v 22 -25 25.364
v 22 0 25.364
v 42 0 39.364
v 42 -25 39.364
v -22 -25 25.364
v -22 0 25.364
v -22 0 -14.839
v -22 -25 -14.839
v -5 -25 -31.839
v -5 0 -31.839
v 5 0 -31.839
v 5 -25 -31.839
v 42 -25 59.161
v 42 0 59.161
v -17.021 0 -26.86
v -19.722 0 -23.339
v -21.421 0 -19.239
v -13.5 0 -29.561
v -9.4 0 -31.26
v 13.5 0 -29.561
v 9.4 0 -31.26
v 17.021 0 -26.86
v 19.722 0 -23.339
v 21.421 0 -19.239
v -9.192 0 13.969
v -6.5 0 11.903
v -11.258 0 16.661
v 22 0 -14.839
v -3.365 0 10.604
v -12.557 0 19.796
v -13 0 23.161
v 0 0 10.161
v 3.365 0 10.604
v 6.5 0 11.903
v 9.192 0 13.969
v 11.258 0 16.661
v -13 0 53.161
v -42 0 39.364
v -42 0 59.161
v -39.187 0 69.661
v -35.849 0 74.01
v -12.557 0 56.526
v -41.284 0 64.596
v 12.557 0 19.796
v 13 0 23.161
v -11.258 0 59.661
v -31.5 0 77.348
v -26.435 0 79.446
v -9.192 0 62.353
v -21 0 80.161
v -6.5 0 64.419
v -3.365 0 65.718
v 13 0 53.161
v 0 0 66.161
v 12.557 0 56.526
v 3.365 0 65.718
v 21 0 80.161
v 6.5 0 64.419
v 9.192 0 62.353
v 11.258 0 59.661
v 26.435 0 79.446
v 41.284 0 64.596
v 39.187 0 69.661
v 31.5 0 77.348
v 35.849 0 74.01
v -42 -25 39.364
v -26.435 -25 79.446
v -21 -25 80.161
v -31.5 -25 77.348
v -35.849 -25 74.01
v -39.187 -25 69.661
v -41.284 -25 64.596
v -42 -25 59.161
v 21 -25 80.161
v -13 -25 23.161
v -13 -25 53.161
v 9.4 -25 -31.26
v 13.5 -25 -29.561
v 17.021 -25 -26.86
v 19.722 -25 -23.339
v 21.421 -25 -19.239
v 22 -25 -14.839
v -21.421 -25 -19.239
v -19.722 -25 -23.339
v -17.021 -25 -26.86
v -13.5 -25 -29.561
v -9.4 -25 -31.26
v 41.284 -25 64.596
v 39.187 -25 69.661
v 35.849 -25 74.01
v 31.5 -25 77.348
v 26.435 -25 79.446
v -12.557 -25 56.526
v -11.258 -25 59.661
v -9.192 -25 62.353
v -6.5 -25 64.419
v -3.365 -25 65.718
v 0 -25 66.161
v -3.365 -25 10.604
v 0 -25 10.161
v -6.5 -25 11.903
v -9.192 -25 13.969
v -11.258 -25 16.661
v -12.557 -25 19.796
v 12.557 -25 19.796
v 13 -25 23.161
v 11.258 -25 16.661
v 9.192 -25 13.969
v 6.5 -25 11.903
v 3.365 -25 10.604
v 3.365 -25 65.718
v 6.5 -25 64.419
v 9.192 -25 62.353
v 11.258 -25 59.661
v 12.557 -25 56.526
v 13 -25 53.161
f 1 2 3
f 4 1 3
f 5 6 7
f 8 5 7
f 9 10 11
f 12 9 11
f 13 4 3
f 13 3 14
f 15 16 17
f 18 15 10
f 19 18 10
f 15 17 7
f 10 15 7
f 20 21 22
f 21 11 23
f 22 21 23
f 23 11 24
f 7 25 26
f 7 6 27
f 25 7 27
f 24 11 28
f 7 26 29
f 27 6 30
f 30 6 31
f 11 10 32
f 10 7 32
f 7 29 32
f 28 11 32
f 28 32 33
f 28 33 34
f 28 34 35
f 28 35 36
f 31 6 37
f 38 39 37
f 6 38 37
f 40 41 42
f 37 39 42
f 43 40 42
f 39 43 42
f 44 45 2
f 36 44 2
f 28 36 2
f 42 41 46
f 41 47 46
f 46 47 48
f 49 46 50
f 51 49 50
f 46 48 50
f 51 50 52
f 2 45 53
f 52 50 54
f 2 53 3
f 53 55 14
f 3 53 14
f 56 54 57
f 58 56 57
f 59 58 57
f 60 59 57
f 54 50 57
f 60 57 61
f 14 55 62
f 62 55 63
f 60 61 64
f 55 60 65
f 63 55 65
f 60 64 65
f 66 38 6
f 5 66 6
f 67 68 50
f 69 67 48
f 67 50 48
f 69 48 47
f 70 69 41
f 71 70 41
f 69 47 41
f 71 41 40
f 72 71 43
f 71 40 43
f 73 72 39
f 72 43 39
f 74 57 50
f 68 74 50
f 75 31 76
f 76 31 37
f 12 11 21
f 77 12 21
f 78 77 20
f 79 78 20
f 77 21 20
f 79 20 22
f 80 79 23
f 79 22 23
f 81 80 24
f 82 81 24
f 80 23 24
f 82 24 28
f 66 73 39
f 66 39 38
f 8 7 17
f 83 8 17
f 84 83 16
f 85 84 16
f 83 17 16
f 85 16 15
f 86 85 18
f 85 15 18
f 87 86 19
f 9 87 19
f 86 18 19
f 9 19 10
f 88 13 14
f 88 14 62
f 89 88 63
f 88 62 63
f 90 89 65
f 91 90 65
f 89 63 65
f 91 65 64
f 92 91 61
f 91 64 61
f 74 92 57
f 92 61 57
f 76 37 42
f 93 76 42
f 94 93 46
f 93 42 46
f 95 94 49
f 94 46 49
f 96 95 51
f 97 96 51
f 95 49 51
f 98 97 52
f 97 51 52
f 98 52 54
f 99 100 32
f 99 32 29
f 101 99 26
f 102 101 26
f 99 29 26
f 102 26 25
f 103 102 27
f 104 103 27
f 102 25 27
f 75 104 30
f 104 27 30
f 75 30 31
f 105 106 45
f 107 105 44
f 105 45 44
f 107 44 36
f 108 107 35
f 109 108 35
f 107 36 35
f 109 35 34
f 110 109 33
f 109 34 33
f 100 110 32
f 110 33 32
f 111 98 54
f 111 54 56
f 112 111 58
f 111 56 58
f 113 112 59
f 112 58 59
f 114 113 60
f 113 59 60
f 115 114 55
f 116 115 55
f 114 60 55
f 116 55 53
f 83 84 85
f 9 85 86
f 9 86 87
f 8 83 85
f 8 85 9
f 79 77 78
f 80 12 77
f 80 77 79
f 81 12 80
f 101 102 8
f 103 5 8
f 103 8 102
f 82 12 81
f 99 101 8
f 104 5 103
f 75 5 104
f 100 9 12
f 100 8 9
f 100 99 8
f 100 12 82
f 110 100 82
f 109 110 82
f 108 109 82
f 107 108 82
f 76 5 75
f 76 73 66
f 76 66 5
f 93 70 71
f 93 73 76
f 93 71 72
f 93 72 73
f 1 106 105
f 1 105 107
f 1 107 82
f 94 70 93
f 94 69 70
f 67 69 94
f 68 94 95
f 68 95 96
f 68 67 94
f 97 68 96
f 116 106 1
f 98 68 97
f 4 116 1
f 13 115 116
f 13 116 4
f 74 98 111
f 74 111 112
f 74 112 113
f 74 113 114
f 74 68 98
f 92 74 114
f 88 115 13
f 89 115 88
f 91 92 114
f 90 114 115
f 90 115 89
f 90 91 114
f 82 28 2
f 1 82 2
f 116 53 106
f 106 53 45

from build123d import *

# Parameters (mm, degrees)
F1_DEPTH = 25


with BuildPart() as f1:
    # F0 (on Front) → F1 (new body)
    with BuildSketch(Plane.XZ):
        with BuildLine():
            Line((-22, 25.36407), (-22, -14.838923))
            ThreePointArc((-22, -14.838923), (-17.020815, -26.859738), (-5, -31.838923))
            Line((-5, -31.838923), (0, -31.838923))
            Line((0, -31.838923), (5, -31.838923))
            ThreePointArc((5, -31.838923), (17.020815, -26.859738), (22, -14.838923))
            Line((22, -14.838923), (22, 25.36407))
            Line((22, 25.36407), (42, 39.36407))
            Line((42, 39.36407), (42, 59.161077))
            ThreePointArc((42, 59.161077), (35.849242, 74.010319), (21, 80.161077))
            Line((21, 80.161077), (0, 80.161077))
            Line((0, 80.161077), (-21, 80.161077))
            ThreePointArc((-21, 80.161077), (-35.849242, 74.010319), (-42, 59.161077))
            Line((-42, 59.161077), (-42, 39.36407))
            Line((-42, 39.36407), (-22, 25.36407))
        make_face()
        with BuildLine():
            ThreePointArc((-13, 53.161077), (-9.192388, 62.353465), (0, 66.161077))
            ThreePointArc((0, 66.161077), (9.192388, 62.353465), (13, 53.161077))
            Line((13, 53.161077), (13, 23.161077))
            ThreePointArc((13, 23.161077), (9.192388, 13.968689), (0, 10.161077))
            ThreePointArc((0, 10.161077), (-9.192388, 13.968689), (-13, 23.161077))
            Line((-13, 23.161077), (-13, 53.161077))
        make_face(mode=Mode.SUBTRACT)
    extrude(amount=F1_DEPTH)


solid = f1.part
